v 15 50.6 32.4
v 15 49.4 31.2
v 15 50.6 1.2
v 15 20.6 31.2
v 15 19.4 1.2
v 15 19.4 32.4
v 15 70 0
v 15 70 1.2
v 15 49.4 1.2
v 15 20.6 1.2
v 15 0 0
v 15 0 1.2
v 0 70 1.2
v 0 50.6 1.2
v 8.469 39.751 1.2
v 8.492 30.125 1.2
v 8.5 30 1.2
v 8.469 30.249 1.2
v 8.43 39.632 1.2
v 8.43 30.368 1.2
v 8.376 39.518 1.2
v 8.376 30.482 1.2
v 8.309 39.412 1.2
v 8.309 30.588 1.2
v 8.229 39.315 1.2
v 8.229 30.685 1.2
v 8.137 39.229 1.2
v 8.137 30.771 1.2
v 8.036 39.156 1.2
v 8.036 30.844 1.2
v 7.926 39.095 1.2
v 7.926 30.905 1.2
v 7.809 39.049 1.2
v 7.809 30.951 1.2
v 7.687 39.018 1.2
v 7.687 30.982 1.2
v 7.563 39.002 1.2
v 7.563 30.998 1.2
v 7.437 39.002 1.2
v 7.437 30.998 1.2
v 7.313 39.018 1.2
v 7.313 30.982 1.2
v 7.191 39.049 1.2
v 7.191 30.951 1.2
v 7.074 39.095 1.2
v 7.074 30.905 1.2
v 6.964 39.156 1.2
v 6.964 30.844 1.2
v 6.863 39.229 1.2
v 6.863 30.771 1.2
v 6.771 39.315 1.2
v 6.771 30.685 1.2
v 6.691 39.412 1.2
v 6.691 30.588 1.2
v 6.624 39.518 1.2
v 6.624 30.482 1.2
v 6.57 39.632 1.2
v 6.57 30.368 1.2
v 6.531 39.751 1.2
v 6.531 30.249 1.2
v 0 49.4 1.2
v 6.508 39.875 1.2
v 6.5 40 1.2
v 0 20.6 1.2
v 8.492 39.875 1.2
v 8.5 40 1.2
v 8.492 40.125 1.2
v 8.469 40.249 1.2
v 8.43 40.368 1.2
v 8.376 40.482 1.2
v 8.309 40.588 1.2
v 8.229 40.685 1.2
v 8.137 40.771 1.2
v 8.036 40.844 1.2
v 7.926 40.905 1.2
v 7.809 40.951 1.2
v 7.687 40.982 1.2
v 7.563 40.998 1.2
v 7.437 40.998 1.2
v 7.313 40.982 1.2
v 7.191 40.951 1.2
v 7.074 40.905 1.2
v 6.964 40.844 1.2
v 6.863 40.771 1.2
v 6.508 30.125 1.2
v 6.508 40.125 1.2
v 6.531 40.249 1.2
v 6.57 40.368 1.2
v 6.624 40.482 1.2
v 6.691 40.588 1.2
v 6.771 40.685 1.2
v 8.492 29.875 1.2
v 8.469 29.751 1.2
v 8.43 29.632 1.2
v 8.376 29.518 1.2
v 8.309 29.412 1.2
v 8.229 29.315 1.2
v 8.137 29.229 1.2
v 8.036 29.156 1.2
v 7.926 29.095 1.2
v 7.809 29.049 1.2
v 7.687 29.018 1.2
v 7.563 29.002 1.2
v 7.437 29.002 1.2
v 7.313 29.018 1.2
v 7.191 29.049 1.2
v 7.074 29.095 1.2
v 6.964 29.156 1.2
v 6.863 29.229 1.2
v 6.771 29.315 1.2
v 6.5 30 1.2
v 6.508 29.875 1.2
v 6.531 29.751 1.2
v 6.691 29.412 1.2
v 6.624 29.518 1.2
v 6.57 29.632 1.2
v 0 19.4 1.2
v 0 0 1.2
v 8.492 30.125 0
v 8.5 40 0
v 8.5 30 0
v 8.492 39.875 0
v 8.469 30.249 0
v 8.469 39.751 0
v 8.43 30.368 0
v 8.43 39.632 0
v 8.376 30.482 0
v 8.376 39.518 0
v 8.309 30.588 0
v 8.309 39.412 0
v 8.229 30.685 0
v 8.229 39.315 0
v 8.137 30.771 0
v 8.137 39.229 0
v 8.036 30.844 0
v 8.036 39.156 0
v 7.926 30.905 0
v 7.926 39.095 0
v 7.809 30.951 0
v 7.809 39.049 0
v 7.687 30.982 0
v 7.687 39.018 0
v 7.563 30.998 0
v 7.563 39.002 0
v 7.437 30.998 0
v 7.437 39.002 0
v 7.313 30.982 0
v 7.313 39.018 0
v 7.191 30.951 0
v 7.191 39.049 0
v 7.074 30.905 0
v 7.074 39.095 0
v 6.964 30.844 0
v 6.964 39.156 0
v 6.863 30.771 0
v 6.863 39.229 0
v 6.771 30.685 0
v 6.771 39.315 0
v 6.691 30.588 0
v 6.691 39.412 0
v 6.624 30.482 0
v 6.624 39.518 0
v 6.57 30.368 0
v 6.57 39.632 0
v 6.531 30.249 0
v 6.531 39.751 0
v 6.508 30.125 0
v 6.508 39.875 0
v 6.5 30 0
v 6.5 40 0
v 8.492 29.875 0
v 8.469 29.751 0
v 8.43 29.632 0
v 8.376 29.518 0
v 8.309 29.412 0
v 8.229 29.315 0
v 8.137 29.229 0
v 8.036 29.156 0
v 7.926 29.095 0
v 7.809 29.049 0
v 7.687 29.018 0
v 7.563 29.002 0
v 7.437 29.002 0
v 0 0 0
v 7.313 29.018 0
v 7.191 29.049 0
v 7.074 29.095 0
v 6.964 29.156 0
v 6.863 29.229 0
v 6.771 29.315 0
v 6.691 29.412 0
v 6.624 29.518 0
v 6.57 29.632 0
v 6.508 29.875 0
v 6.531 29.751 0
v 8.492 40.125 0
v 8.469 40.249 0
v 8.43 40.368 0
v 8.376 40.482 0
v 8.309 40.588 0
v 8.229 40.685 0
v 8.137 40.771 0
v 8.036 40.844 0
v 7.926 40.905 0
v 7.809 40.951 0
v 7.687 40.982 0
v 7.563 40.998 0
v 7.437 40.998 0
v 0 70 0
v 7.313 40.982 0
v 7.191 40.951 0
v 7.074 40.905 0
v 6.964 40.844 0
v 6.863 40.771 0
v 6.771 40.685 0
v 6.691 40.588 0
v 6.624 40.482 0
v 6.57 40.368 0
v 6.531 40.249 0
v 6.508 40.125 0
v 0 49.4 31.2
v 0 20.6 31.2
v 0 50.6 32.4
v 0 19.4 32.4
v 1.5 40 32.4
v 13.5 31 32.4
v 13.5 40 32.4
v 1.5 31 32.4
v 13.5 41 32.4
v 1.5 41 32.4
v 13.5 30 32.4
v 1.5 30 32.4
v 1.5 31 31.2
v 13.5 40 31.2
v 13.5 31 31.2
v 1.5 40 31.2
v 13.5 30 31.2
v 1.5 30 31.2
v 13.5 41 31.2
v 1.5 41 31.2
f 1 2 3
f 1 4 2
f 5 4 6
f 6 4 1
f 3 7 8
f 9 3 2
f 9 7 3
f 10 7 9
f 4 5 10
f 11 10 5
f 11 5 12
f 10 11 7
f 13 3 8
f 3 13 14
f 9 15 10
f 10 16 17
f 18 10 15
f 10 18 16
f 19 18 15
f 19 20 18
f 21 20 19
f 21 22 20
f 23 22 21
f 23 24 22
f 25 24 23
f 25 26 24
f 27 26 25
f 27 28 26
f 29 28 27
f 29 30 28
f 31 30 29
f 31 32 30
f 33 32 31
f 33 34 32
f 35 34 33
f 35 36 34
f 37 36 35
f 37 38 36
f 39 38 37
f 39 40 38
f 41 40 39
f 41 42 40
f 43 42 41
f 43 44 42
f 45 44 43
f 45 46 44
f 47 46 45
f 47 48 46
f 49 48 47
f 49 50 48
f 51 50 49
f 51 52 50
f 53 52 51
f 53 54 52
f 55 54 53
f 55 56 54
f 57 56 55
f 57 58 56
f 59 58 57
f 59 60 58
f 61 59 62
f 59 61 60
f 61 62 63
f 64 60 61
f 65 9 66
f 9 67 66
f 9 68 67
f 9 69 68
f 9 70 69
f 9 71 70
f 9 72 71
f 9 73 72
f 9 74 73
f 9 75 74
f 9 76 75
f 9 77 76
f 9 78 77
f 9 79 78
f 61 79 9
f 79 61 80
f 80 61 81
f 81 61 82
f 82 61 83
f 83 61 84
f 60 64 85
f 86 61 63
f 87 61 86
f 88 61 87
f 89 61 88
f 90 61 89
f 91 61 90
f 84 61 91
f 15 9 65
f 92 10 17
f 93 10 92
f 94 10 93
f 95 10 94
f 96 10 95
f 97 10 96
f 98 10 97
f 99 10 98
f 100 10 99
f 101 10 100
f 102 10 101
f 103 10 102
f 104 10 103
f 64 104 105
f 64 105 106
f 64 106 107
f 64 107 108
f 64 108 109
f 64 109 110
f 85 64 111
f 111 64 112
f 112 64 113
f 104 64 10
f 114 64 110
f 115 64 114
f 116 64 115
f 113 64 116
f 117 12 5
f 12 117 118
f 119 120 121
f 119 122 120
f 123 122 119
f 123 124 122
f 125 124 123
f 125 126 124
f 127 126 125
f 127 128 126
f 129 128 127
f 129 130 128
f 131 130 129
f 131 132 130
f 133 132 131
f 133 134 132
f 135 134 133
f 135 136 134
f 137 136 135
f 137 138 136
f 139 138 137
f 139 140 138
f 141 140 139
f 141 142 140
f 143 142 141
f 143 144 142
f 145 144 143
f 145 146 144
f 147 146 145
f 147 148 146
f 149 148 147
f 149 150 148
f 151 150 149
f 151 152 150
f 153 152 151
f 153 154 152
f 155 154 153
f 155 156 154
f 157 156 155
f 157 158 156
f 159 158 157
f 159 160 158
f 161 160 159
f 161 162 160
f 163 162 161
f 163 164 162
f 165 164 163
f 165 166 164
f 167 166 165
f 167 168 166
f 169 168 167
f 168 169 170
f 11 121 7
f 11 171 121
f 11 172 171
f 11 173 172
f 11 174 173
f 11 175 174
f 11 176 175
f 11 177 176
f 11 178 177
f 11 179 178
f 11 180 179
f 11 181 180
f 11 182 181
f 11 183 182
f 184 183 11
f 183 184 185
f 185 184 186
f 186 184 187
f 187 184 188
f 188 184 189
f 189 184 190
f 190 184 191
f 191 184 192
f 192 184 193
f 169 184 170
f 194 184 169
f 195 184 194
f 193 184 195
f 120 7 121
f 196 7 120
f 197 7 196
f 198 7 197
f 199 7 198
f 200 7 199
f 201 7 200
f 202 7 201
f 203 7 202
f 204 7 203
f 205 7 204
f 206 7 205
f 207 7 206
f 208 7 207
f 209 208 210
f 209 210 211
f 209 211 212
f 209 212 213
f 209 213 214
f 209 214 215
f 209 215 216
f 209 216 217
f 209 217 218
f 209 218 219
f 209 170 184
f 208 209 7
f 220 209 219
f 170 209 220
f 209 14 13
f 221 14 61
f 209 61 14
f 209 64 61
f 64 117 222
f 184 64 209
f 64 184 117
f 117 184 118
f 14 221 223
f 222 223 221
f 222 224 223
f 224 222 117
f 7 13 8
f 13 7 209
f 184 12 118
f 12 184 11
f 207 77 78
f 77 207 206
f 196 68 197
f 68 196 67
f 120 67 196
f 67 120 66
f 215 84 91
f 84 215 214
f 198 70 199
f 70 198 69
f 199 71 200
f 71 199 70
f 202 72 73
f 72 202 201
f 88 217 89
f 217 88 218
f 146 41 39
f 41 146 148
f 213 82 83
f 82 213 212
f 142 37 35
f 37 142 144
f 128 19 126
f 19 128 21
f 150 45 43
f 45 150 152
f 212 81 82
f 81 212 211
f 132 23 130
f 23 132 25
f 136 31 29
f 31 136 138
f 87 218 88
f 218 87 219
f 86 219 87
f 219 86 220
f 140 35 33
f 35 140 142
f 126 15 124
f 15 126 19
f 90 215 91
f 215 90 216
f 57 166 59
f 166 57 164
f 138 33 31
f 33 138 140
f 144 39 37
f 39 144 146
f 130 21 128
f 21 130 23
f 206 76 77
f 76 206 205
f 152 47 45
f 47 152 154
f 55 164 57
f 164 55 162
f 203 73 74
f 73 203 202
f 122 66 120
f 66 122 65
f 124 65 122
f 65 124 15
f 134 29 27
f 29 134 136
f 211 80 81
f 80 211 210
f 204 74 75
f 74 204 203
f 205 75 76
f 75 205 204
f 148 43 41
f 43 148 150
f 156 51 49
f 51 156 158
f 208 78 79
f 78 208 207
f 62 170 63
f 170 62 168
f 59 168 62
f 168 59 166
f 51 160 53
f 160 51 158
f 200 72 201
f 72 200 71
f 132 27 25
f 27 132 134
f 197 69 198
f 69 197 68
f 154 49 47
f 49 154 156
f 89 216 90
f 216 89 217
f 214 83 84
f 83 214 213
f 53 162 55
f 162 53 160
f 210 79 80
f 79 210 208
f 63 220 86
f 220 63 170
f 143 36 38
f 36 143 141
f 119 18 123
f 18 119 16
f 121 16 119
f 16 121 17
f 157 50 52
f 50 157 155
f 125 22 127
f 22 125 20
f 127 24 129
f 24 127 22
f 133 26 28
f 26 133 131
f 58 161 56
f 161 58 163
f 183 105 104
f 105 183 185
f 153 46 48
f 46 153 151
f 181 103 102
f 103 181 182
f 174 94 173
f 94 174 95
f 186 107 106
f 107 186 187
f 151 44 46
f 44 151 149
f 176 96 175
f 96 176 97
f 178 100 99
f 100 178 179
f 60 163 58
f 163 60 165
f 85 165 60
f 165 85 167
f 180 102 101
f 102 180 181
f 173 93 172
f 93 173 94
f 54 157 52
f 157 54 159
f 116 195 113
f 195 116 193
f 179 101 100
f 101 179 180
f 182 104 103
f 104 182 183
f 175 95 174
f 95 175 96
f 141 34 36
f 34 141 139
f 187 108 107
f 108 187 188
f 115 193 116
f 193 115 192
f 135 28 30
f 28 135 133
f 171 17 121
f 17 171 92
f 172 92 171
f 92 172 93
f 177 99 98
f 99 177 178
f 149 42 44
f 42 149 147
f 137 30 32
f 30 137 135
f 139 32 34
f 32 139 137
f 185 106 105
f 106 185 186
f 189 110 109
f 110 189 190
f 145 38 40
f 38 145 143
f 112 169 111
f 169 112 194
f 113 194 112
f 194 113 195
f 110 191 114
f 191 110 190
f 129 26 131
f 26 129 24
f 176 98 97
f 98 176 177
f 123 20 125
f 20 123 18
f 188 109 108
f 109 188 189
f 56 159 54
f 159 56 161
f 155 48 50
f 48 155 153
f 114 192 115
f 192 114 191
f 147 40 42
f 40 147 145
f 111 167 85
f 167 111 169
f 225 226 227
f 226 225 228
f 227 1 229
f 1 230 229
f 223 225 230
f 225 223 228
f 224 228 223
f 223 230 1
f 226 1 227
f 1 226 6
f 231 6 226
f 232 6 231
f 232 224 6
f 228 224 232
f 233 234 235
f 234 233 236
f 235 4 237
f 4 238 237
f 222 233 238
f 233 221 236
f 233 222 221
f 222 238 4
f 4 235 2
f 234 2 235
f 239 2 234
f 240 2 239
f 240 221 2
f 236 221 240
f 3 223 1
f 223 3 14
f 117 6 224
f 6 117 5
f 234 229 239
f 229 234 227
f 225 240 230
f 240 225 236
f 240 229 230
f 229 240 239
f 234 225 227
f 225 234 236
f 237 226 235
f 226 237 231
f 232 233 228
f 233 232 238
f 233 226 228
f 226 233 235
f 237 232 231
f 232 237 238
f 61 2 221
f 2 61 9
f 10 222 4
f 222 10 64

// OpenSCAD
// Electrode holder for an electrochemistry experiment I'm doing.
// This is bad, but whatever

w = 15;
h = 70;
t = 1.2;
r = 1;
d = 10; // distance apart
b = 30; // approx. width of beaker
a = 30; // approx. height of alligator clips

ew = 12; // electrode width
ed = 1; // electrode depth

$fn = 50;

difference() {
    cube([w, h, t]);
    translate([w/2, d/2 + h/2]) cylinder(t, r=r);
    translate([w/2, -d/2 + h/2]) cylinder(t, r=r);
}

translate([0, h/2 + b/2 - t/2, t]) cube([w, t, a]);
translate([0, h/2 - b/2 - t/2, t]) cube([w, t, a]);

difference() {
    translate([0, h/2 - b/2 - t/2, t + a]) cube([w, b + t, t]);
    translate([w/2 - ew/2, d/2 + h/2, t + a]) cube([ew, ed, t]);
    translate([w/2 - ew/2, -d/2 + h/2, t + a]) cube([ew, ed, t]);
}
